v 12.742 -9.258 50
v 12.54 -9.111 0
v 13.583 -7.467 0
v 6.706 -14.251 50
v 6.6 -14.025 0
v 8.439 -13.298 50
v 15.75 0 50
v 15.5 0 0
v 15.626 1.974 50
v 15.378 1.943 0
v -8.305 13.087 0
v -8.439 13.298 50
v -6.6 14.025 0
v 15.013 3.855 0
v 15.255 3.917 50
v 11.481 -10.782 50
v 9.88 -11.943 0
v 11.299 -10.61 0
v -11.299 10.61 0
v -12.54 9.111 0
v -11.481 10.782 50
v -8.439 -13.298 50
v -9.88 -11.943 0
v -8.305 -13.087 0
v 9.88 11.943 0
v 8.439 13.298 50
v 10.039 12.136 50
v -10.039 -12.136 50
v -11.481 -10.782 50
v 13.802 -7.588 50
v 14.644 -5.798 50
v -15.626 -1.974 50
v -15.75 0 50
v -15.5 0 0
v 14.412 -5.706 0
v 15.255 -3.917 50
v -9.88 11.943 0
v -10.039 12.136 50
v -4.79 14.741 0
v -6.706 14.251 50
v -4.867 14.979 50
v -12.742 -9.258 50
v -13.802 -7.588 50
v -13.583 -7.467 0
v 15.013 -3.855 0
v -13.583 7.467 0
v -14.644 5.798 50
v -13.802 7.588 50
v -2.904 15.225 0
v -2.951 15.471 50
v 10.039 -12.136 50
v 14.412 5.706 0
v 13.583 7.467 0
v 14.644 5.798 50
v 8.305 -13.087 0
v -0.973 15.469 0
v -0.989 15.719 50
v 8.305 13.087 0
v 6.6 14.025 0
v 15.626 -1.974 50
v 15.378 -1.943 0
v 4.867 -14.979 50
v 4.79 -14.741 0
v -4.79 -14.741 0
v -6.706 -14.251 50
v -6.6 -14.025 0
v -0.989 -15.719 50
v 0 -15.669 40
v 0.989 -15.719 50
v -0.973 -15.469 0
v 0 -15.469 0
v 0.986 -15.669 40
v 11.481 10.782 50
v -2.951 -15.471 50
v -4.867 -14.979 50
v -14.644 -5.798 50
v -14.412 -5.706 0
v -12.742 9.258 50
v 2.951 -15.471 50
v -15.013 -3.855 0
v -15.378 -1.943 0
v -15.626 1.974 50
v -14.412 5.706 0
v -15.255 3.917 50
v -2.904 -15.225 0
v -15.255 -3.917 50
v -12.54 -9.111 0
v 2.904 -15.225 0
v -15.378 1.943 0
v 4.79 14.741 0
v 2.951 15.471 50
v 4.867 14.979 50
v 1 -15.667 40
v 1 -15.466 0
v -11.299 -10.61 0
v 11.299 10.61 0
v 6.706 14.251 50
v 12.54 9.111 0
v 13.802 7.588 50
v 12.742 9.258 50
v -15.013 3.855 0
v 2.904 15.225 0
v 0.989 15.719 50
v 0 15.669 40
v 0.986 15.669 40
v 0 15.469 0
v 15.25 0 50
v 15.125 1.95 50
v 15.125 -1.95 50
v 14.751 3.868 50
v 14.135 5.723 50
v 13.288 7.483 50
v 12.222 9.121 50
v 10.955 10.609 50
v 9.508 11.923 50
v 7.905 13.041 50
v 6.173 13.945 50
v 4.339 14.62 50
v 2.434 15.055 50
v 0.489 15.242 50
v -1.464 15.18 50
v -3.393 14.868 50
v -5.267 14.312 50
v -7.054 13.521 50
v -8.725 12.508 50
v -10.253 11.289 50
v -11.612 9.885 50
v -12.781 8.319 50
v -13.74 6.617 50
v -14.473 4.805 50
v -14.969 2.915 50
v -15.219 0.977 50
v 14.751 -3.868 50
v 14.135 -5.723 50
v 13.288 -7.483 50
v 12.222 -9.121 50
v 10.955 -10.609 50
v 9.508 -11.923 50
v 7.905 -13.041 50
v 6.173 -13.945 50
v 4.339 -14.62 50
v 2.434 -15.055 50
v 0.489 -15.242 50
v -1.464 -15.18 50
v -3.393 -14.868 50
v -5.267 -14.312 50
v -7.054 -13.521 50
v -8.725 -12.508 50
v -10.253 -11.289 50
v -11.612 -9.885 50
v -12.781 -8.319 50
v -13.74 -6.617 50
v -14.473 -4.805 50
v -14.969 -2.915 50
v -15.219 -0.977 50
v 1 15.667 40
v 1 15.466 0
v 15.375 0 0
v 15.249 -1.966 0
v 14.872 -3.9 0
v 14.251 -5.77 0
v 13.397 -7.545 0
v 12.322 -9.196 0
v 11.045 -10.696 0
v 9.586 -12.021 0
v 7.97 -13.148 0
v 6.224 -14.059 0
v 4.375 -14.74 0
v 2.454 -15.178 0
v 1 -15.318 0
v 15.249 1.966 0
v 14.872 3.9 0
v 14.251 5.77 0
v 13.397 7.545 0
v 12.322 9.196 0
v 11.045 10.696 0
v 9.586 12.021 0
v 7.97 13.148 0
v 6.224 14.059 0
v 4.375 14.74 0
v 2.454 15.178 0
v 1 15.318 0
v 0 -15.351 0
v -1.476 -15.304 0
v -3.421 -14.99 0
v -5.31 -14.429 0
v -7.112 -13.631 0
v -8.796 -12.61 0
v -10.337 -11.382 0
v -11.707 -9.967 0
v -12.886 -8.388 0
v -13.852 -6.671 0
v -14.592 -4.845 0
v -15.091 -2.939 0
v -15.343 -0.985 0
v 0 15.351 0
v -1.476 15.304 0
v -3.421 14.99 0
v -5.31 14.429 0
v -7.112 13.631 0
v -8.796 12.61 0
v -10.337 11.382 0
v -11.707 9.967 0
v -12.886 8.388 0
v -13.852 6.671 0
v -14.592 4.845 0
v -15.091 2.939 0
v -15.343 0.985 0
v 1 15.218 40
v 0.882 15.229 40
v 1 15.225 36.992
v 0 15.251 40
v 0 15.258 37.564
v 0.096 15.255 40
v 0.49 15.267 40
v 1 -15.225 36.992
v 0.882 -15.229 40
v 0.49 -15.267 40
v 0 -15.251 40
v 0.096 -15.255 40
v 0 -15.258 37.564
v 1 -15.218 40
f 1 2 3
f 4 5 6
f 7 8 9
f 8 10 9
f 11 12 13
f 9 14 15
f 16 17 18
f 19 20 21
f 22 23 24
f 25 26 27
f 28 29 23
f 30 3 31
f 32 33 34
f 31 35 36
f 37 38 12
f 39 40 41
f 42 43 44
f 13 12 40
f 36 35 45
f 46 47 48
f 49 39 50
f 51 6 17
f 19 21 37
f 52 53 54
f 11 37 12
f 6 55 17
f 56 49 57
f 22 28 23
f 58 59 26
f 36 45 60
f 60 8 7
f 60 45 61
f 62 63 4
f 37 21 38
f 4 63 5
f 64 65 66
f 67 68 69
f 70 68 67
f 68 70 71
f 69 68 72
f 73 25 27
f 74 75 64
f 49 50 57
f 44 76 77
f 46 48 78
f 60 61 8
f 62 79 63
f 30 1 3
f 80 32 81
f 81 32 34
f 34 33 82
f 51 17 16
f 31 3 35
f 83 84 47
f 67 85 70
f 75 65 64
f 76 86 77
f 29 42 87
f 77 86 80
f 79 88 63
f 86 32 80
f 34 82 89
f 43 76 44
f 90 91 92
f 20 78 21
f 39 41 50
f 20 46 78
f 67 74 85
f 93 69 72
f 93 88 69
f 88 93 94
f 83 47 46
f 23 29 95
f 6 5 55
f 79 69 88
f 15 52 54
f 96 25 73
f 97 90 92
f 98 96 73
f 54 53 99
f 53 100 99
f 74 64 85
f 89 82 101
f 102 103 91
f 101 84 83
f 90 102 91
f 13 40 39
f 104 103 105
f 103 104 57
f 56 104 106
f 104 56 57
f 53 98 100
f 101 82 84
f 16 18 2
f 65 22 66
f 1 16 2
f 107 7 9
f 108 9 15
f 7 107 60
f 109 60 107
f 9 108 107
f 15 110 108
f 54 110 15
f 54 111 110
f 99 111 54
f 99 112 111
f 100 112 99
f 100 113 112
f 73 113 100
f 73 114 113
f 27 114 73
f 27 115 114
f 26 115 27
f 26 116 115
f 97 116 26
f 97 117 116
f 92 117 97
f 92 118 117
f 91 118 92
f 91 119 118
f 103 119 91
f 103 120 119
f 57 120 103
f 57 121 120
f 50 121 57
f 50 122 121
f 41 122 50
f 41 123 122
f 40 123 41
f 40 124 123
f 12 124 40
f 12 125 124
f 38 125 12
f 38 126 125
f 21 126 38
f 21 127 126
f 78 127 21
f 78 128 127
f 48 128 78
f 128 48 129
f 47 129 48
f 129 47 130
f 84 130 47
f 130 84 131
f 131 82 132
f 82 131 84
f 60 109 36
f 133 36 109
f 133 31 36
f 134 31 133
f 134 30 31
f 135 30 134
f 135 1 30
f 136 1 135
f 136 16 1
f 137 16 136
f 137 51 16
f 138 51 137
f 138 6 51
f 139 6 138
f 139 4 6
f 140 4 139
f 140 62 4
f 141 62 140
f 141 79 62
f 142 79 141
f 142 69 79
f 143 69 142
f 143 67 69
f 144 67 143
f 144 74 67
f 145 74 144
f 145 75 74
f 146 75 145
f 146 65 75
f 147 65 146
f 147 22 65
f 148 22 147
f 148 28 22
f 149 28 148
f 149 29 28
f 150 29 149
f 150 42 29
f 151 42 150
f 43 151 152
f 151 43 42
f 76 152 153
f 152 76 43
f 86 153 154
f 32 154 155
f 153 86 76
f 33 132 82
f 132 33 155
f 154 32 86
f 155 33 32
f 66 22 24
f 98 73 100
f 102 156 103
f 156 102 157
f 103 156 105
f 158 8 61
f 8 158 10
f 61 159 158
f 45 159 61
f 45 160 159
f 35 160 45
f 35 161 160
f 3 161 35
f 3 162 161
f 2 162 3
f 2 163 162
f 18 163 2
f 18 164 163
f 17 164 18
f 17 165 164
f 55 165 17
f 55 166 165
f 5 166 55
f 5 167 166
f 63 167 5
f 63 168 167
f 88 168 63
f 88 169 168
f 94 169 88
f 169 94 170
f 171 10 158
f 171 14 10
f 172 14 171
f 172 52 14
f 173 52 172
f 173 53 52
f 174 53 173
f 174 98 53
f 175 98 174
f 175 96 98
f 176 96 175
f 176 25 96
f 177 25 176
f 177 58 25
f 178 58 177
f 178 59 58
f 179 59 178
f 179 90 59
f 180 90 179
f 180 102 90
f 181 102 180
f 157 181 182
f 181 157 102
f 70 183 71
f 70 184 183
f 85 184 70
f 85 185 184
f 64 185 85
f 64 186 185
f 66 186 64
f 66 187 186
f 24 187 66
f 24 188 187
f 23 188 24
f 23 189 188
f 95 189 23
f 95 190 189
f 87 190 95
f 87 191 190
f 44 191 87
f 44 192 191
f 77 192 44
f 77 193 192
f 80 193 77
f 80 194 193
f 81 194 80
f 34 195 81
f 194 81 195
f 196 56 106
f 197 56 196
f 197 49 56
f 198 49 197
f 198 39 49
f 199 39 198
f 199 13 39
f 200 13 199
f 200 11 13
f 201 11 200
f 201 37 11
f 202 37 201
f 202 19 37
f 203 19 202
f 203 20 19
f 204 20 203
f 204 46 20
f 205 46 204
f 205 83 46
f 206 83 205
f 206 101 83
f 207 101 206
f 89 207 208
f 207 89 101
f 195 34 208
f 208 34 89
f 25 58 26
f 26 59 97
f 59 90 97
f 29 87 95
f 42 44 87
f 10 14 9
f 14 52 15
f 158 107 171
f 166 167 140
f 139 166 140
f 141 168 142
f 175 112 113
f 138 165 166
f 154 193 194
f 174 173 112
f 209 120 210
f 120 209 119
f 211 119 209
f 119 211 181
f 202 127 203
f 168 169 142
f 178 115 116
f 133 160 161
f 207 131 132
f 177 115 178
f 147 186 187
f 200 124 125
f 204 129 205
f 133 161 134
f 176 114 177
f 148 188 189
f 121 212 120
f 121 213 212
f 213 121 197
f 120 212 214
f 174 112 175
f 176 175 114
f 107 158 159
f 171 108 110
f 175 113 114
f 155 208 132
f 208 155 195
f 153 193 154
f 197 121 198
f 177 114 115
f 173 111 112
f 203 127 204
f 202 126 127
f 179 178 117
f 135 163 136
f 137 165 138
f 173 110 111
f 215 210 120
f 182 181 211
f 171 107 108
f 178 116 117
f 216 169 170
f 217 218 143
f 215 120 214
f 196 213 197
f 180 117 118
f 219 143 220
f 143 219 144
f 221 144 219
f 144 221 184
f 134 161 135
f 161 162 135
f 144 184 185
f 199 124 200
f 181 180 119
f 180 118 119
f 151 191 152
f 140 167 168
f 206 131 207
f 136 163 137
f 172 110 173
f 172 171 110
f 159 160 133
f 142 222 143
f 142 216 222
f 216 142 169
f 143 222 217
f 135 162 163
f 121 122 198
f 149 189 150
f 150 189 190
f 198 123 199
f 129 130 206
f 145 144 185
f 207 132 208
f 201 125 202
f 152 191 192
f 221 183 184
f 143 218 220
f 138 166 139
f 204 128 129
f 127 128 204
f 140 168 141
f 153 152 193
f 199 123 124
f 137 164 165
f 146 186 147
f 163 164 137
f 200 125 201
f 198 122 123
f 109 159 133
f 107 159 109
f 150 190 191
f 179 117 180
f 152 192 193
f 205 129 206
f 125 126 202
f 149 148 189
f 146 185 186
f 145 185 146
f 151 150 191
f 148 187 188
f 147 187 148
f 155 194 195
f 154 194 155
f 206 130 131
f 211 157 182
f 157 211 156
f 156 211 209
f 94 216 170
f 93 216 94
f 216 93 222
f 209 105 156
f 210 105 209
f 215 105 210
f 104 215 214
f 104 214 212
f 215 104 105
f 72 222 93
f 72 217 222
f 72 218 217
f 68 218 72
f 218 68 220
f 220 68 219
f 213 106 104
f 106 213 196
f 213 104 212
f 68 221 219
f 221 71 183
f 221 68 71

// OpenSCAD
$fa=1;

difference() {
    cylinder(50, 31.0/2, 31.5/2);
    cylinder(50, 30.75/2, 30.5/2);
    translate([0, -30])
    #cube([1, 50, 40]);
}
